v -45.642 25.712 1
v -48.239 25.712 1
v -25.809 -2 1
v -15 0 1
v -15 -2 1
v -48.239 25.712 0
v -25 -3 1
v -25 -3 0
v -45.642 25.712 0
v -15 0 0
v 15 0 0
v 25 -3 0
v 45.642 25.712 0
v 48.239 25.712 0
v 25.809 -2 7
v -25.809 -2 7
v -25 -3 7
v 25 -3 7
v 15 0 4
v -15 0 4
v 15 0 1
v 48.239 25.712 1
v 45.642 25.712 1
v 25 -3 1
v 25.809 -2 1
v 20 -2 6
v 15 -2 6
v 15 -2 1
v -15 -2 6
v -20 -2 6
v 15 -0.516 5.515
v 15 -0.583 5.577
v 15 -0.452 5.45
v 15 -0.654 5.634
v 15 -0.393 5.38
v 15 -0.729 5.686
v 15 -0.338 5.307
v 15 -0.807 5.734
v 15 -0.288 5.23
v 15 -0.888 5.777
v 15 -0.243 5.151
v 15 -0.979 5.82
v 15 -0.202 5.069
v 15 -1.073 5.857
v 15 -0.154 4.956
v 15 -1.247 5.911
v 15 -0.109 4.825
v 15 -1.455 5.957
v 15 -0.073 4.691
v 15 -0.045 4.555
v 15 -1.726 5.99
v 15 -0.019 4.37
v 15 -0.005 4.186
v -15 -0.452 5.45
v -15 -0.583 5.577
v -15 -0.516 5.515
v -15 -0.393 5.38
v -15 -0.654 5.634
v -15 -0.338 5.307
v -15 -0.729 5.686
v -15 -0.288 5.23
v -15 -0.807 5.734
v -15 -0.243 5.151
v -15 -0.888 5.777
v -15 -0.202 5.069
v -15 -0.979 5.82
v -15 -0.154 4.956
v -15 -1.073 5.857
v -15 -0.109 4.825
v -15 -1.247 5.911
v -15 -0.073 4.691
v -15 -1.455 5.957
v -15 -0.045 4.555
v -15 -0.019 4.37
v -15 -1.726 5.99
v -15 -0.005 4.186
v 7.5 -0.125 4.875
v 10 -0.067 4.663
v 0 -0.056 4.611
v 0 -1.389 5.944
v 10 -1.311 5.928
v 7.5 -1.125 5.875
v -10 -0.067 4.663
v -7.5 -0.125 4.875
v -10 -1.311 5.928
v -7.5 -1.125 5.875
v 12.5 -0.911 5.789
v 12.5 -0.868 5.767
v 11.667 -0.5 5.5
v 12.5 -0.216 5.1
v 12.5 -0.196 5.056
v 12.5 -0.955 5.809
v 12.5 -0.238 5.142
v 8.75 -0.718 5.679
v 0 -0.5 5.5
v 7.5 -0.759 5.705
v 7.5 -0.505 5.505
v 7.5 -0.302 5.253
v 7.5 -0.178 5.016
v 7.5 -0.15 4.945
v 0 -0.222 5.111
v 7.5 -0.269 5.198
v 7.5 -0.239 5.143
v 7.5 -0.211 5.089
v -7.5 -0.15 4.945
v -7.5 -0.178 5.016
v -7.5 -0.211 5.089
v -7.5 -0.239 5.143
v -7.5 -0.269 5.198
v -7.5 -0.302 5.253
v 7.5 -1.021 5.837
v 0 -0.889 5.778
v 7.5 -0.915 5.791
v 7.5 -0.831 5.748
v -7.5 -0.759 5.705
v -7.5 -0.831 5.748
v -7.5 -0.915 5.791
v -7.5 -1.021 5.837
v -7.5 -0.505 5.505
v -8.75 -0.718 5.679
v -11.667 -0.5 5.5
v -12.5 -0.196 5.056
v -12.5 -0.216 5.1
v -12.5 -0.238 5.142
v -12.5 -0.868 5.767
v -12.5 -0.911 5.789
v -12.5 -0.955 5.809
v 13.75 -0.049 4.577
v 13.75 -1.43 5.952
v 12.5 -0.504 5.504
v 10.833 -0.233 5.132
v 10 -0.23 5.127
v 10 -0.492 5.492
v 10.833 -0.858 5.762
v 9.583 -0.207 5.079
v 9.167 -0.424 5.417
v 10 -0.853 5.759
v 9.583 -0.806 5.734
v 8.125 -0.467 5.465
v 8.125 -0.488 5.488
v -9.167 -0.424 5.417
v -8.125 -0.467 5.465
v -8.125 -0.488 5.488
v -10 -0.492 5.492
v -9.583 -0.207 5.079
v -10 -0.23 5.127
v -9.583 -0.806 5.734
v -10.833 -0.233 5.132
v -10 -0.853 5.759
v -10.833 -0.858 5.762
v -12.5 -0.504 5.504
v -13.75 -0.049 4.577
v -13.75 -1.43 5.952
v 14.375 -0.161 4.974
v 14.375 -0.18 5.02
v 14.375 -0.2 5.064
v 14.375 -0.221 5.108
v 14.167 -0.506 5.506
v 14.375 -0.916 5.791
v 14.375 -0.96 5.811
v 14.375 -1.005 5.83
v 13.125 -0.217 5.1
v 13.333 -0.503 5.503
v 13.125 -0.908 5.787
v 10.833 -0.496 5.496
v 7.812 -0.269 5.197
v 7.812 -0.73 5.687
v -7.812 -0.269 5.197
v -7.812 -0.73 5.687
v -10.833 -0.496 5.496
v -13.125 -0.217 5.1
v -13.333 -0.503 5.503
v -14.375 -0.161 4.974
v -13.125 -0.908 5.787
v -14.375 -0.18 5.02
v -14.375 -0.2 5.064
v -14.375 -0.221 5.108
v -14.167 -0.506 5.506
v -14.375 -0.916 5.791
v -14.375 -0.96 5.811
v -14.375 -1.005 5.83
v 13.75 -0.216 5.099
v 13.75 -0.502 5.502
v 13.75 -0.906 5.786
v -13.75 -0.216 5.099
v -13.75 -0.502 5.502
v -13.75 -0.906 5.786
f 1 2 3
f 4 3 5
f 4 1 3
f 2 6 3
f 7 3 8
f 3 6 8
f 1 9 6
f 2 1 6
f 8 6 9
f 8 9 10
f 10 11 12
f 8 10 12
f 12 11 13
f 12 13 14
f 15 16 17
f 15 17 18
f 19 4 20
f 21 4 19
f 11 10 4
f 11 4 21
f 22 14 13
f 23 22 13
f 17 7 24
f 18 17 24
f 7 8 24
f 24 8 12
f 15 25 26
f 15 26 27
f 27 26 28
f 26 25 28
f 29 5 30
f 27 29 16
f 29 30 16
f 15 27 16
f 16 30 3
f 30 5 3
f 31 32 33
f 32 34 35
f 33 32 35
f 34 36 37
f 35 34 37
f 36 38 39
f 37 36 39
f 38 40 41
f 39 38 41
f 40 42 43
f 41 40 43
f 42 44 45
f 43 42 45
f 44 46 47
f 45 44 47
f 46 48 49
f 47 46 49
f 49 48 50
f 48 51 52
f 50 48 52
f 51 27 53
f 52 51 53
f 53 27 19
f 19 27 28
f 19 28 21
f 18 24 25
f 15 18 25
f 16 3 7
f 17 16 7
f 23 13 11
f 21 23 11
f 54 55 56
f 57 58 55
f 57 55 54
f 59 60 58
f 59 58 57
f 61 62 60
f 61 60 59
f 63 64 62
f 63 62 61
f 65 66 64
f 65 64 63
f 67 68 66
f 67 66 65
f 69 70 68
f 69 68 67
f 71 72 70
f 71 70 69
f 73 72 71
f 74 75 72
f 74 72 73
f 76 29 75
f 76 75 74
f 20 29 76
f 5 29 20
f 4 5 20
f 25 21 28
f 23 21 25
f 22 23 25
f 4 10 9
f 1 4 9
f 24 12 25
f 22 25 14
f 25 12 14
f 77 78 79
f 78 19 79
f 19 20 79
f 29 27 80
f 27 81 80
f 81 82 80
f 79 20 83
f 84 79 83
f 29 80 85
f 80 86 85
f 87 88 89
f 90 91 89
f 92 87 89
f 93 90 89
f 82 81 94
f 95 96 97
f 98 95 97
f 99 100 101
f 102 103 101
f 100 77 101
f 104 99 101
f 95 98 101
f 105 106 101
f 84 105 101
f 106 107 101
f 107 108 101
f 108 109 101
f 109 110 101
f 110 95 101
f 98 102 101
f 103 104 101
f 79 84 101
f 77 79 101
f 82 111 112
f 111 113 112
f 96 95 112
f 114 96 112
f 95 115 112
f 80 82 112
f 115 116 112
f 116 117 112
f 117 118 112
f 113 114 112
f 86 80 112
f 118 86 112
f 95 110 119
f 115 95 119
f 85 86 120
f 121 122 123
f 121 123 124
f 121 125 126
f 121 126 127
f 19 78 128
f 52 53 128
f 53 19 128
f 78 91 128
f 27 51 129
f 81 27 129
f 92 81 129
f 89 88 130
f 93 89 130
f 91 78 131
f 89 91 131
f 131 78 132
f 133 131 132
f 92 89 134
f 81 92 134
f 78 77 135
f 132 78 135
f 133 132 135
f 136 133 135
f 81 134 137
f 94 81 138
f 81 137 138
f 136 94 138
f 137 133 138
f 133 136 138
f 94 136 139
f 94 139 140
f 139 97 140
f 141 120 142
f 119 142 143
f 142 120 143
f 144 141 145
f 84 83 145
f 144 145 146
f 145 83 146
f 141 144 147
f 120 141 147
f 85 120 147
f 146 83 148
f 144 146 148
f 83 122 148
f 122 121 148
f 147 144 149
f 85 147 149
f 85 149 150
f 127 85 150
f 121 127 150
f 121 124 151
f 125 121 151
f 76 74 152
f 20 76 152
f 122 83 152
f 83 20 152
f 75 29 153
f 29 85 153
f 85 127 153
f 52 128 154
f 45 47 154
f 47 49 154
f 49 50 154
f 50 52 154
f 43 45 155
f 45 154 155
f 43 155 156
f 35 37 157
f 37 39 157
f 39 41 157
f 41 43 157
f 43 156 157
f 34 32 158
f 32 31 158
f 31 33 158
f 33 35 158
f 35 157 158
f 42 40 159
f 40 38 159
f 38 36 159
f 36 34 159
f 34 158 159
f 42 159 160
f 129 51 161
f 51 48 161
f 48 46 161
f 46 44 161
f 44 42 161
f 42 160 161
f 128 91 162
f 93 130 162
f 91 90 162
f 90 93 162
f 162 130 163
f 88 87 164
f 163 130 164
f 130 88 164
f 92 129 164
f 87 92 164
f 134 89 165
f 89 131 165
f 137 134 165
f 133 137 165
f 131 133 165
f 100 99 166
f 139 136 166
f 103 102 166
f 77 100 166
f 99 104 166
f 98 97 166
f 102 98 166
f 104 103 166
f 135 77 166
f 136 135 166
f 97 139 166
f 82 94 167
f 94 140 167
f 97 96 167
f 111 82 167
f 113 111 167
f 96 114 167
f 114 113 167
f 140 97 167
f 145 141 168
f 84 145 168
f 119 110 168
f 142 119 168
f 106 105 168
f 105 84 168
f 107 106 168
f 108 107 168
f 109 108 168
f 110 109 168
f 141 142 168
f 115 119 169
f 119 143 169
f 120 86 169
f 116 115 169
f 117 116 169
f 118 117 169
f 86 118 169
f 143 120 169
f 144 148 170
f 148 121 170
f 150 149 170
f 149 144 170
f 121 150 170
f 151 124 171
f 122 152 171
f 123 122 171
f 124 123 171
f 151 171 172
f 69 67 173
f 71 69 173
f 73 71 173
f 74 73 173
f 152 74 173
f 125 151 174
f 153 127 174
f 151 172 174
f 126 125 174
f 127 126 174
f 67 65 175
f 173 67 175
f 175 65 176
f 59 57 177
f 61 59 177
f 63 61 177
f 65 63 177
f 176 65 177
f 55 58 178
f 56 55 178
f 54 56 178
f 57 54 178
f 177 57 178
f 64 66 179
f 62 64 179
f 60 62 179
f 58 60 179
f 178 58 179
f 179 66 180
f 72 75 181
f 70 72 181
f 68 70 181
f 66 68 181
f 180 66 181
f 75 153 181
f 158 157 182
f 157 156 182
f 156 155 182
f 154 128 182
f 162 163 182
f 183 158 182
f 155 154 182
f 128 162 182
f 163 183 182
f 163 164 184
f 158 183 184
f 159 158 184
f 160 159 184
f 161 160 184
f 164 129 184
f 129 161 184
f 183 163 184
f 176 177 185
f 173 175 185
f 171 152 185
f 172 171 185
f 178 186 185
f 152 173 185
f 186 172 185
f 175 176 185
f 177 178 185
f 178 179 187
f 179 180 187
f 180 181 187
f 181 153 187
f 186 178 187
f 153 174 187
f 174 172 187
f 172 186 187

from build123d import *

# Parameters (mm, degrees)
F1_DEPTH    = 1
F3_DEPTH    = 6
F2_W        = 30
F2_H        = 2
F4_DEPTH    = 5
F5_T1_DEPTH = 40


# Not quite as in the source:
# - a fillet or chamfer that OpenCascade refuses, or shapes differently, is made with other operations: its cross-section is extruded or revolved along the edge and cut away or added


with BuildPart() as f1:
    # F0 (on Top) → F1 (new body)
    with BuildSketch(Plane.XY):
        Polygon((15, 0), (0, 0), (-15, 0), (-45.6417777248, 25.7115043875), (-48.2388163507, 25.7115043875), (-25, -3), (0, -3), (25, -3), (48.2388163507, 25.7115043875), (45.6417777248, 25.7115043875), align=None)
    extrude(amount=F1_DEPTH)

    # F2 (on face) → F3 (join)
    with BuildSketch(Plane.XY.offset(1)):
        Polygon((-15, -2), (-25.8093904115, -2), (-25, -3), (25, -3), (25.8093904115, -2), (15, -2), align=None)
    extrude(amount=F3_DEPTH)

    # F2 (on face) → F4 (join)
    with BuildSketch(Plane.XY.offset(1)):
        with Locations((0, -1)):
            Rectangle(F2_W, F2_H)
    extrude(amount=F4_DEPTH)

    # F5: fillet of radius 2 on 1 edges, made by hand

    # F5_s2 → F5_t1 (cut)
    with BuildSketch(Plane.YZ.offset(-20)):
        with BuildLine():
            add(Edge.make_bspline(
                [(0, 4), (0, 6), (-2, 6)],
                knots=[0, 0, 0, 1, 1, 1], degree=2, weights=[1, 1, 1]))
            Line((-2, 6), (0, 6))
            Line((0, 6), (0, 4))
        make_face()
    extrude(amount=F5_T1_DEPTH, mode=Mode.SUBTRACT)


solid = f1.part
